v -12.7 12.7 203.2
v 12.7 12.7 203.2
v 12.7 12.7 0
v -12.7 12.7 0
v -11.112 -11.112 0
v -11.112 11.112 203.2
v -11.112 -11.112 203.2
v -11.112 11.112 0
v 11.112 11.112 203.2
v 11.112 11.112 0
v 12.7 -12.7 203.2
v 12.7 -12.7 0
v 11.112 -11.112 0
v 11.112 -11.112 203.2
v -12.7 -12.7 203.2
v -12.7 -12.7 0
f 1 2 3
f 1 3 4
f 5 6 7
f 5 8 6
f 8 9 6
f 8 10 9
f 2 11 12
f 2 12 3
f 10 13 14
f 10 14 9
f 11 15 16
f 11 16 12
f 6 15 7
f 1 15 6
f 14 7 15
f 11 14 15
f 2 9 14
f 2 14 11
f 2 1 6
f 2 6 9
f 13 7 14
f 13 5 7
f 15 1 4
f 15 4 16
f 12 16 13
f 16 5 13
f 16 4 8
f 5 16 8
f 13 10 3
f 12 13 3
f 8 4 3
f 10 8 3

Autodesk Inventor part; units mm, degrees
ref_plane "YZ Plane" through (0, 0, 0) normal (1, 0, 0) x (0, 1, 0)
ref_plane "XZ Plane" through (0, 0, 0) normal (0, 1, 0) x (-1, 0, 0)
ref_plane "XY Plane" through (0, 0, 0) normal (0, 0, 1) x (1, 0, 0)
sketch "Sketch1" plane through (0, 0, 0) normal (0, 0, 1) x (1, 0, 0)
  line L0 (-12.7, -12.7) -> (12.7, -12.7)
  line L1 (12.7, -12.7) -> (12.7, 12.7)
  line L2 (12.7, 12.7) -> (-12.7, 12.7)
  line L3 (-12.7, 12.7) -> (-12.7, -12.7)
  line L4 (-11.1125, -11.1125) -> (11.1125, -11.1125)
  line L5 (11.1125, -11.1125) -> (11.1125, 11.1125)
  line L6 (11.1125, 11.1125) -> (-11.1125, 11.1125)
  line L7 (-11.1125, 11.1125) -> (-11.1125, -11.1125)
  point P0 (0, 0)
  dimension "d0" = 25.4
  dimension "d1" = 25.4
  dimension "d2" = 22.225
  dimension "d3" = 22.225
extrude "Extrusion1" add sketch "Sketch1" along normal blind 203.2
equation "\"BendRadius\" = Thickness"
equation "\"BendReliefWidth\" = Thickness"
equation "\"BendReliefDepth\" = 0.5 * Thickness"
equation "\"CornerReliefSize\" = 4 * Thickness"
equation "\"MinimumRemnant\" = 2 * Thickness"
equation "\"TransitionRadius\" = BendRadius"
equation "\"JacobiRadiusSize\" = BendRadius"
equation "\"GapSize\" = Thickness"
equation "\"Thickness\" = 3.048"
properties part number "8 in 1-16"
